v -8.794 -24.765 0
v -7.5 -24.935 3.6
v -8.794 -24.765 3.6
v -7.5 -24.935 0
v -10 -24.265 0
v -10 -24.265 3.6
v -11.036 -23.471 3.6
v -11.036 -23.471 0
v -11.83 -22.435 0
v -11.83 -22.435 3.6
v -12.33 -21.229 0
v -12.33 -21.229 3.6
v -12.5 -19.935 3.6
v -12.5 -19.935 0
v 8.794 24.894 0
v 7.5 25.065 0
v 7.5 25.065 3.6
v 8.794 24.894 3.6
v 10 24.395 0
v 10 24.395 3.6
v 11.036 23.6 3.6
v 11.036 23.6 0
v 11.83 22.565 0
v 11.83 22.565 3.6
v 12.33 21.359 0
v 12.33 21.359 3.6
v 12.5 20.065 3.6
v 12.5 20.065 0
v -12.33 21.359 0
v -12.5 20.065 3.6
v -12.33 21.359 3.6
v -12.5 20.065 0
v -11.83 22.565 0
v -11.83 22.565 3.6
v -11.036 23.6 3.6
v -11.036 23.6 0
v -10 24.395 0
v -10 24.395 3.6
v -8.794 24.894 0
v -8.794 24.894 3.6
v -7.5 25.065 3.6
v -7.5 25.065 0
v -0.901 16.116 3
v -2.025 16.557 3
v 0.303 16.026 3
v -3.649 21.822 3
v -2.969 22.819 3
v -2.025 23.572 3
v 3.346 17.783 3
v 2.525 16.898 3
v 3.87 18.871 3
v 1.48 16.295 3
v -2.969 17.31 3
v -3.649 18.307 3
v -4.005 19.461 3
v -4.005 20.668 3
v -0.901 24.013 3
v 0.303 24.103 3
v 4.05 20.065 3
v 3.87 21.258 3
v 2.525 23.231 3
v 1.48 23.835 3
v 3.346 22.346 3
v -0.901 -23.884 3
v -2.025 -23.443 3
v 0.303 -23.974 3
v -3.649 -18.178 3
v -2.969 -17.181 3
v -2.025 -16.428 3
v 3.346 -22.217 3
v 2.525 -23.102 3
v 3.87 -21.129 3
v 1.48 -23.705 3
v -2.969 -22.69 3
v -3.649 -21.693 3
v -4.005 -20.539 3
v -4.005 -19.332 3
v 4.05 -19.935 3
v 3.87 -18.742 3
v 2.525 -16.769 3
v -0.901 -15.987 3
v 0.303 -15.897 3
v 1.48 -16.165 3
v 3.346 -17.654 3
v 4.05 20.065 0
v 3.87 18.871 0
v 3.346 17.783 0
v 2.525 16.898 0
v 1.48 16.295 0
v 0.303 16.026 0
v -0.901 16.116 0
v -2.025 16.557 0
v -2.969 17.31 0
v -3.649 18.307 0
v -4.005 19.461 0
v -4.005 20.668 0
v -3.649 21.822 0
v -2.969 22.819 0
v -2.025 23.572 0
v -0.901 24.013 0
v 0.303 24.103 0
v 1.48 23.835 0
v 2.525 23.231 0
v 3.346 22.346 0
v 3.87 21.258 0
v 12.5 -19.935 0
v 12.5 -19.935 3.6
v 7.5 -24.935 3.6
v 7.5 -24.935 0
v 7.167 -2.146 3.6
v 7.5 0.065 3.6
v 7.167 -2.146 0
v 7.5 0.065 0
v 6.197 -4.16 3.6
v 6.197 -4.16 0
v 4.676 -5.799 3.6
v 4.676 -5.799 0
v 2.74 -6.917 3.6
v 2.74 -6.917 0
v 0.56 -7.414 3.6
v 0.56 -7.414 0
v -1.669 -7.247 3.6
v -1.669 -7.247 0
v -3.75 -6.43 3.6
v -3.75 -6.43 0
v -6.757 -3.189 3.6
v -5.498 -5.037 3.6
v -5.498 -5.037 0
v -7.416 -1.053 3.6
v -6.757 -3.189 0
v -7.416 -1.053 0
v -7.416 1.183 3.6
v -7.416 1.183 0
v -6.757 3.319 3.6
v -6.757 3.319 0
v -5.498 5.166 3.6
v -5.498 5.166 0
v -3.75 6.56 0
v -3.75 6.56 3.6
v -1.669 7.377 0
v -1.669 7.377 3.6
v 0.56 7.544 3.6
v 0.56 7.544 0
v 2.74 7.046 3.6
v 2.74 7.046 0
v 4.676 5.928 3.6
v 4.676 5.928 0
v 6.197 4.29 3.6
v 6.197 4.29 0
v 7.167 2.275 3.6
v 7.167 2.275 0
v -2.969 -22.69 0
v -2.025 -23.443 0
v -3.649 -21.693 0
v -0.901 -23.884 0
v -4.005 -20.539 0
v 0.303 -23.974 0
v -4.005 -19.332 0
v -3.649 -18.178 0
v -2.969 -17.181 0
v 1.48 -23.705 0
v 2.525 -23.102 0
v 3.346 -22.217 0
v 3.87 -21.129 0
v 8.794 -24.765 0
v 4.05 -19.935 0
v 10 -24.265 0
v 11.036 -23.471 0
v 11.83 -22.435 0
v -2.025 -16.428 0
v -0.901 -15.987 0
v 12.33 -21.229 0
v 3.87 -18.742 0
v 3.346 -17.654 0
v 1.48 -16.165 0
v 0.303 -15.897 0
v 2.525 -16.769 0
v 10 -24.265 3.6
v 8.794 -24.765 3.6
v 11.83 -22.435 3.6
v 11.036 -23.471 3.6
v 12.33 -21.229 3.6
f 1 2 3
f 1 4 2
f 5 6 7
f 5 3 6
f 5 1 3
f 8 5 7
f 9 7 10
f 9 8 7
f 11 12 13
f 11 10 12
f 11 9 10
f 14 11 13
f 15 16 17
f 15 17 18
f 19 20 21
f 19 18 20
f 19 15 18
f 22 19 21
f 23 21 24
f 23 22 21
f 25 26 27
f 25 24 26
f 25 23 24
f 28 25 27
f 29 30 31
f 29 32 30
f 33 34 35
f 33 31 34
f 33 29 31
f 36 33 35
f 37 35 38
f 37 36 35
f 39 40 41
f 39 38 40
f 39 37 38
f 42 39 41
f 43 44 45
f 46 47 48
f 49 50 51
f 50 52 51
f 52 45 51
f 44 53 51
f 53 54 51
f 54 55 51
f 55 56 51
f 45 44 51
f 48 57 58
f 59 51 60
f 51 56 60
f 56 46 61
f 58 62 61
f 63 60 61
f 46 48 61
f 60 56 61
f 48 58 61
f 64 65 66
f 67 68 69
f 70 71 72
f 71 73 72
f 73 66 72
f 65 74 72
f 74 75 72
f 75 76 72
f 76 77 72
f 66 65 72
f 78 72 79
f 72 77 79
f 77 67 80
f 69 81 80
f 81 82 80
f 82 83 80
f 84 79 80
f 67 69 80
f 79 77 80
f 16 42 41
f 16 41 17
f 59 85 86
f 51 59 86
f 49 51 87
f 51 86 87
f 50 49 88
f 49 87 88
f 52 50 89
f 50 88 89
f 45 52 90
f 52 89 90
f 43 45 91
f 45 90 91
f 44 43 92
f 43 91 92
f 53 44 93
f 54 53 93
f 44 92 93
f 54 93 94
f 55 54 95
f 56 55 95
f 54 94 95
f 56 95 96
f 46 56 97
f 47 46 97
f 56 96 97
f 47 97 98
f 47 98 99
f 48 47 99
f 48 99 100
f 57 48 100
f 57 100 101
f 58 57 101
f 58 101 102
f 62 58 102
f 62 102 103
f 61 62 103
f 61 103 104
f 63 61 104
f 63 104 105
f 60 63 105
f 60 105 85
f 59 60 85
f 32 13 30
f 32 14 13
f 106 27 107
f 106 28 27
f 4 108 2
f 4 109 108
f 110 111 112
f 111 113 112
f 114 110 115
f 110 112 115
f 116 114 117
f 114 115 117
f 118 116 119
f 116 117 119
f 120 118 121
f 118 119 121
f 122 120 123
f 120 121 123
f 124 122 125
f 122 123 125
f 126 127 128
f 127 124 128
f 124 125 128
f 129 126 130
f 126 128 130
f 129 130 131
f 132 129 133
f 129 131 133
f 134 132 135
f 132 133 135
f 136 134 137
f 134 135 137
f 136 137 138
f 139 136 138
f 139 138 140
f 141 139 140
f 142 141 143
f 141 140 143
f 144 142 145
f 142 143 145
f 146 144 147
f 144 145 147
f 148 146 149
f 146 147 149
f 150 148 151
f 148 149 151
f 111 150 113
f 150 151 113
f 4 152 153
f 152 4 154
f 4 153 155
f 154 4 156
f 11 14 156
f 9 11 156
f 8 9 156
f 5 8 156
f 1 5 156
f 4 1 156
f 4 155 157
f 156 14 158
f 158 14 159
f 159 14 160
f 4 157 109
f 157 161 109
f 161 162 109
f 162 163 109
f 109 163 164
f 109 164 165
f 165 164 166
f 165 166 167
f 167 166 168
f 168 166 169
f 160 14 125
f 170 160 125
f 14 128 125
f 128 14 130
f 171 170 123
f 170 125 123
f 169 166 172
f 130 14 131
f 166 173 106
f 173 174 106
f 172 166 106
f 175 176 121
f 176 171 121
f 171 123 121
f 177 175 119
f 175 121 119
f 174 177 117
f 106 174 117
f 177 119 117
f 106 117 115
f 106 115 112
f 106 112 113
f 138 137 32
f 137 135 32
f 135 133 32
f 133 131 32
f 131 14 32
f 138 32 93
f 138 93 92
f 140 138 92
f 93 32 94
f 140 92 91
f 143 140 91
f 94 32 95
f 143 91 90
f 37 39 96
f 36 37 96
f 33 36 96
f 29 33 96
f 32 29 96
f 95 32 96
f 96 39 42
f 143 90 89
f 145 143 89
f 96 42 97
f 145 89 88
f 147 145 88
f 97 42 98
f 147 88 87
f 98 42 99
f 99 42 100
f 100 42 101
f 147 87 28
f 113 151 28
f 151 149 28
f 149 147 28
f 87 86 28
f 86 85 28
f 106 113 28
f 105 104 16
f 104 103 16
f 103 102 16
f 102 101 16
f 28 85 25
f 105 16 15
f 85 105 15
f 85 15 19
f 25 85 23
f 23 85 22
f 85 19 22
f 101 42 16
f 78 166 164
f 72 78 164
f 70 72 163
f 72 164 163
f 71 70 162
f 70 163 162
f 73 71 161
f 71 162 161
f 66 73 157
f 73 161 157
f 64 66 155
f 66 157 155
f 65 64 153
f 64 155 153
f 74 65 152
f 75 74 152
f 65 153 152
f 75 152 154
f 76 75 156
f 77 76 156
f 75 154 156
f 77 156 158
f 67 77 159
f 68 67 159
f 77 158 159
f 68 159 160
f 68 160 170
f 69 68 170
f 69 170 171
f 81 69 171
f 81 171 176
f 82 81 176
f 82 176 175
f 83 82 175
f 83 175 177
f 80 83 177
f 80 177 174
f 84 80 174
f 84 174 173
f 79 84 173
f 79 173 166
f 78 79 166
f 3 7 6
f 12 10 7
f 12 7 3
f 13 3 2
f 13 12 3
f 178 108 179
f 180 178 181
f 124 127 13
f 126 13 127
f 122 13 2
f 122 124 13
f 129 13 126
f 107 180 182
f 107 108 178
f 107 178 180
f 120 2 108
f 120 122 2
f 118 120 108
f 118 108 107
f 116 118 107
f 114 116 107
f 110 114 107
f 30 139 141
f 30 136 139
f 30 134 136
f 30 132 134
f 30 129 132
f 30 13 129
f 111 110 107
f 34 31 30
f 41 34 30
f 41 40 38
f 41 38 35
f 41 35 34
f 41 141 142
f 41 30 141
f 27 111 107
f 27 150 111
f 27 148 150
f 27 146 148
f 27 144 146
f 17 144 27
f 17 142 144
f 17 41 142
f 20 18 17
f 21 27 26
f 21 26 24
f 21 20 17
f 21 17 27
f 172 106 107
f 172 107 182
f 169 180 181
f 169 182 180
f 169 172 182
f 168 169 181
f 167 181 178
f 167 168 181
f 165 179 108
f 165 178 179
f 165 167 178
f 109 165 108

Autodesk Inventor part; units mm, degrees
ref_plane "YZ Plane" through (0, 0, 0) normal (1, 0, 0) x (0, 1, 0)
ref_plane "XZ Plane" through (0, 0, 0) normal (0, 1, 0) x (-1, 0, 0)
ref_plane "XY Plane" through (0, 0, 0) normal (0, 0, 1) x (1, 0, 0)
sketch "Sketch1" plane through (0, 0, 0) normal (0, 0, 1) x (1, 0, 0)
  line L0 (0, -36.3851) -> (0, 36.5144) construction
  circle A0 centre (0, 0.0647) radius 20
  circle A1 centre (0, 20.0647) radius 4.05
  circle A2 centre (0, -19.9353) radius 4.05
  line L1 (7.5, -24.9353) -> (-7.5, -24.9353)
  line L2 (-12.5, -19.9353) -> (-12.5, 20.0647)
  line L3 (-7.5, 25.0647) -> (7.5, 25.0647)
  line L4 (12.5, 20.0647) -> (12.5, -19.9353)
  line L5 (12.5, -24.9353) -> (-12.5, 25.0647) construction
  line L6 (-12.5, -24.9353) -> (12.5, 25.0647) construction
  arc A3 (-7.5, 25.0647) -> (-12.5, 20.0647) centre (-7.5, 20.0647) ccw
  arc A4 (12.5, 20.0647) -> (7.5, 25.0647) centre (7.5, 20.0647) ccw
  arc A5 (7.5, -24.9353) -> (12.5, -19.9353) centre (7.5, -19.9353) ccw
  arc A6 (-12.5, -19.9353) -> (-7.5, -24.9353) centre (-7.5, -19.9353) ccw
  circle A7 centre (0, 0.0647) radius 7.5
  dimension "d6" = 40
  dimension "d7" = 8.1
  dimension "d8" = 8.1
  dimension "d9" = 25
  dimension "d10" = 50
  dimension "d11" = 5
  dimension "d12" = 15
extrude "Extrusion1" add sketch "Sketch1" along normal blind 3 contours L4 A0 A2 L2 A1 | A0 A1 L2 A3 L3 A4 L4 | L4 A5 L1 A6 L2 A0 A2
sketch "Skizze2" plane through (0, 0, 3) normal (0, 0, 1) x (1, 0, 0)
  circle A0 centre (0, 20.0647) radius 4.05 projected
  circle A1 centre (0, 0.0647) radius 7.5 projected
  circle A2 centre (0, -19.9353) radius 4.05 projected
  arc A3 (12.5, 20.0647) -> (7.5, 25.0647) centre (7.5, 20.0647) ccw projected
  line L0 (7.5, 25.0647) -> (-7.5, 25.0647) projected
  arc A4 (-7.5, 25.0647) -> (-12.5, 20.0647) centre (-7.5, 20.0647) ccw projected
  line L1 (-12.5, 20.0647) -> (-12.5, -19.9353) projected
  arc A5 (-12.5, -19.9353) -> (-7.5, -24.9353) centre (-7.5, -19.9353) ccw projected
  line L2 (-7.5, -24.9353) -> (7.5, -24.9353) projected
  arc A6 (7.5, -24.9353) -> (12.5, -19.9353) centre (7.5, -19.9353) ccw projected
  line L3 (12.5, -19.9353) -> (12.5, 20.0647) projected
  point P0 (0, 0)
extrude "Extrusion2" add sketch "Skizze2" along normal blind 0.6 contours A0 | A2 | L3 A6 L2 A5 L1 A4 L0 A3
properties part number "20_Cube_Insert_Sample_clamp"
